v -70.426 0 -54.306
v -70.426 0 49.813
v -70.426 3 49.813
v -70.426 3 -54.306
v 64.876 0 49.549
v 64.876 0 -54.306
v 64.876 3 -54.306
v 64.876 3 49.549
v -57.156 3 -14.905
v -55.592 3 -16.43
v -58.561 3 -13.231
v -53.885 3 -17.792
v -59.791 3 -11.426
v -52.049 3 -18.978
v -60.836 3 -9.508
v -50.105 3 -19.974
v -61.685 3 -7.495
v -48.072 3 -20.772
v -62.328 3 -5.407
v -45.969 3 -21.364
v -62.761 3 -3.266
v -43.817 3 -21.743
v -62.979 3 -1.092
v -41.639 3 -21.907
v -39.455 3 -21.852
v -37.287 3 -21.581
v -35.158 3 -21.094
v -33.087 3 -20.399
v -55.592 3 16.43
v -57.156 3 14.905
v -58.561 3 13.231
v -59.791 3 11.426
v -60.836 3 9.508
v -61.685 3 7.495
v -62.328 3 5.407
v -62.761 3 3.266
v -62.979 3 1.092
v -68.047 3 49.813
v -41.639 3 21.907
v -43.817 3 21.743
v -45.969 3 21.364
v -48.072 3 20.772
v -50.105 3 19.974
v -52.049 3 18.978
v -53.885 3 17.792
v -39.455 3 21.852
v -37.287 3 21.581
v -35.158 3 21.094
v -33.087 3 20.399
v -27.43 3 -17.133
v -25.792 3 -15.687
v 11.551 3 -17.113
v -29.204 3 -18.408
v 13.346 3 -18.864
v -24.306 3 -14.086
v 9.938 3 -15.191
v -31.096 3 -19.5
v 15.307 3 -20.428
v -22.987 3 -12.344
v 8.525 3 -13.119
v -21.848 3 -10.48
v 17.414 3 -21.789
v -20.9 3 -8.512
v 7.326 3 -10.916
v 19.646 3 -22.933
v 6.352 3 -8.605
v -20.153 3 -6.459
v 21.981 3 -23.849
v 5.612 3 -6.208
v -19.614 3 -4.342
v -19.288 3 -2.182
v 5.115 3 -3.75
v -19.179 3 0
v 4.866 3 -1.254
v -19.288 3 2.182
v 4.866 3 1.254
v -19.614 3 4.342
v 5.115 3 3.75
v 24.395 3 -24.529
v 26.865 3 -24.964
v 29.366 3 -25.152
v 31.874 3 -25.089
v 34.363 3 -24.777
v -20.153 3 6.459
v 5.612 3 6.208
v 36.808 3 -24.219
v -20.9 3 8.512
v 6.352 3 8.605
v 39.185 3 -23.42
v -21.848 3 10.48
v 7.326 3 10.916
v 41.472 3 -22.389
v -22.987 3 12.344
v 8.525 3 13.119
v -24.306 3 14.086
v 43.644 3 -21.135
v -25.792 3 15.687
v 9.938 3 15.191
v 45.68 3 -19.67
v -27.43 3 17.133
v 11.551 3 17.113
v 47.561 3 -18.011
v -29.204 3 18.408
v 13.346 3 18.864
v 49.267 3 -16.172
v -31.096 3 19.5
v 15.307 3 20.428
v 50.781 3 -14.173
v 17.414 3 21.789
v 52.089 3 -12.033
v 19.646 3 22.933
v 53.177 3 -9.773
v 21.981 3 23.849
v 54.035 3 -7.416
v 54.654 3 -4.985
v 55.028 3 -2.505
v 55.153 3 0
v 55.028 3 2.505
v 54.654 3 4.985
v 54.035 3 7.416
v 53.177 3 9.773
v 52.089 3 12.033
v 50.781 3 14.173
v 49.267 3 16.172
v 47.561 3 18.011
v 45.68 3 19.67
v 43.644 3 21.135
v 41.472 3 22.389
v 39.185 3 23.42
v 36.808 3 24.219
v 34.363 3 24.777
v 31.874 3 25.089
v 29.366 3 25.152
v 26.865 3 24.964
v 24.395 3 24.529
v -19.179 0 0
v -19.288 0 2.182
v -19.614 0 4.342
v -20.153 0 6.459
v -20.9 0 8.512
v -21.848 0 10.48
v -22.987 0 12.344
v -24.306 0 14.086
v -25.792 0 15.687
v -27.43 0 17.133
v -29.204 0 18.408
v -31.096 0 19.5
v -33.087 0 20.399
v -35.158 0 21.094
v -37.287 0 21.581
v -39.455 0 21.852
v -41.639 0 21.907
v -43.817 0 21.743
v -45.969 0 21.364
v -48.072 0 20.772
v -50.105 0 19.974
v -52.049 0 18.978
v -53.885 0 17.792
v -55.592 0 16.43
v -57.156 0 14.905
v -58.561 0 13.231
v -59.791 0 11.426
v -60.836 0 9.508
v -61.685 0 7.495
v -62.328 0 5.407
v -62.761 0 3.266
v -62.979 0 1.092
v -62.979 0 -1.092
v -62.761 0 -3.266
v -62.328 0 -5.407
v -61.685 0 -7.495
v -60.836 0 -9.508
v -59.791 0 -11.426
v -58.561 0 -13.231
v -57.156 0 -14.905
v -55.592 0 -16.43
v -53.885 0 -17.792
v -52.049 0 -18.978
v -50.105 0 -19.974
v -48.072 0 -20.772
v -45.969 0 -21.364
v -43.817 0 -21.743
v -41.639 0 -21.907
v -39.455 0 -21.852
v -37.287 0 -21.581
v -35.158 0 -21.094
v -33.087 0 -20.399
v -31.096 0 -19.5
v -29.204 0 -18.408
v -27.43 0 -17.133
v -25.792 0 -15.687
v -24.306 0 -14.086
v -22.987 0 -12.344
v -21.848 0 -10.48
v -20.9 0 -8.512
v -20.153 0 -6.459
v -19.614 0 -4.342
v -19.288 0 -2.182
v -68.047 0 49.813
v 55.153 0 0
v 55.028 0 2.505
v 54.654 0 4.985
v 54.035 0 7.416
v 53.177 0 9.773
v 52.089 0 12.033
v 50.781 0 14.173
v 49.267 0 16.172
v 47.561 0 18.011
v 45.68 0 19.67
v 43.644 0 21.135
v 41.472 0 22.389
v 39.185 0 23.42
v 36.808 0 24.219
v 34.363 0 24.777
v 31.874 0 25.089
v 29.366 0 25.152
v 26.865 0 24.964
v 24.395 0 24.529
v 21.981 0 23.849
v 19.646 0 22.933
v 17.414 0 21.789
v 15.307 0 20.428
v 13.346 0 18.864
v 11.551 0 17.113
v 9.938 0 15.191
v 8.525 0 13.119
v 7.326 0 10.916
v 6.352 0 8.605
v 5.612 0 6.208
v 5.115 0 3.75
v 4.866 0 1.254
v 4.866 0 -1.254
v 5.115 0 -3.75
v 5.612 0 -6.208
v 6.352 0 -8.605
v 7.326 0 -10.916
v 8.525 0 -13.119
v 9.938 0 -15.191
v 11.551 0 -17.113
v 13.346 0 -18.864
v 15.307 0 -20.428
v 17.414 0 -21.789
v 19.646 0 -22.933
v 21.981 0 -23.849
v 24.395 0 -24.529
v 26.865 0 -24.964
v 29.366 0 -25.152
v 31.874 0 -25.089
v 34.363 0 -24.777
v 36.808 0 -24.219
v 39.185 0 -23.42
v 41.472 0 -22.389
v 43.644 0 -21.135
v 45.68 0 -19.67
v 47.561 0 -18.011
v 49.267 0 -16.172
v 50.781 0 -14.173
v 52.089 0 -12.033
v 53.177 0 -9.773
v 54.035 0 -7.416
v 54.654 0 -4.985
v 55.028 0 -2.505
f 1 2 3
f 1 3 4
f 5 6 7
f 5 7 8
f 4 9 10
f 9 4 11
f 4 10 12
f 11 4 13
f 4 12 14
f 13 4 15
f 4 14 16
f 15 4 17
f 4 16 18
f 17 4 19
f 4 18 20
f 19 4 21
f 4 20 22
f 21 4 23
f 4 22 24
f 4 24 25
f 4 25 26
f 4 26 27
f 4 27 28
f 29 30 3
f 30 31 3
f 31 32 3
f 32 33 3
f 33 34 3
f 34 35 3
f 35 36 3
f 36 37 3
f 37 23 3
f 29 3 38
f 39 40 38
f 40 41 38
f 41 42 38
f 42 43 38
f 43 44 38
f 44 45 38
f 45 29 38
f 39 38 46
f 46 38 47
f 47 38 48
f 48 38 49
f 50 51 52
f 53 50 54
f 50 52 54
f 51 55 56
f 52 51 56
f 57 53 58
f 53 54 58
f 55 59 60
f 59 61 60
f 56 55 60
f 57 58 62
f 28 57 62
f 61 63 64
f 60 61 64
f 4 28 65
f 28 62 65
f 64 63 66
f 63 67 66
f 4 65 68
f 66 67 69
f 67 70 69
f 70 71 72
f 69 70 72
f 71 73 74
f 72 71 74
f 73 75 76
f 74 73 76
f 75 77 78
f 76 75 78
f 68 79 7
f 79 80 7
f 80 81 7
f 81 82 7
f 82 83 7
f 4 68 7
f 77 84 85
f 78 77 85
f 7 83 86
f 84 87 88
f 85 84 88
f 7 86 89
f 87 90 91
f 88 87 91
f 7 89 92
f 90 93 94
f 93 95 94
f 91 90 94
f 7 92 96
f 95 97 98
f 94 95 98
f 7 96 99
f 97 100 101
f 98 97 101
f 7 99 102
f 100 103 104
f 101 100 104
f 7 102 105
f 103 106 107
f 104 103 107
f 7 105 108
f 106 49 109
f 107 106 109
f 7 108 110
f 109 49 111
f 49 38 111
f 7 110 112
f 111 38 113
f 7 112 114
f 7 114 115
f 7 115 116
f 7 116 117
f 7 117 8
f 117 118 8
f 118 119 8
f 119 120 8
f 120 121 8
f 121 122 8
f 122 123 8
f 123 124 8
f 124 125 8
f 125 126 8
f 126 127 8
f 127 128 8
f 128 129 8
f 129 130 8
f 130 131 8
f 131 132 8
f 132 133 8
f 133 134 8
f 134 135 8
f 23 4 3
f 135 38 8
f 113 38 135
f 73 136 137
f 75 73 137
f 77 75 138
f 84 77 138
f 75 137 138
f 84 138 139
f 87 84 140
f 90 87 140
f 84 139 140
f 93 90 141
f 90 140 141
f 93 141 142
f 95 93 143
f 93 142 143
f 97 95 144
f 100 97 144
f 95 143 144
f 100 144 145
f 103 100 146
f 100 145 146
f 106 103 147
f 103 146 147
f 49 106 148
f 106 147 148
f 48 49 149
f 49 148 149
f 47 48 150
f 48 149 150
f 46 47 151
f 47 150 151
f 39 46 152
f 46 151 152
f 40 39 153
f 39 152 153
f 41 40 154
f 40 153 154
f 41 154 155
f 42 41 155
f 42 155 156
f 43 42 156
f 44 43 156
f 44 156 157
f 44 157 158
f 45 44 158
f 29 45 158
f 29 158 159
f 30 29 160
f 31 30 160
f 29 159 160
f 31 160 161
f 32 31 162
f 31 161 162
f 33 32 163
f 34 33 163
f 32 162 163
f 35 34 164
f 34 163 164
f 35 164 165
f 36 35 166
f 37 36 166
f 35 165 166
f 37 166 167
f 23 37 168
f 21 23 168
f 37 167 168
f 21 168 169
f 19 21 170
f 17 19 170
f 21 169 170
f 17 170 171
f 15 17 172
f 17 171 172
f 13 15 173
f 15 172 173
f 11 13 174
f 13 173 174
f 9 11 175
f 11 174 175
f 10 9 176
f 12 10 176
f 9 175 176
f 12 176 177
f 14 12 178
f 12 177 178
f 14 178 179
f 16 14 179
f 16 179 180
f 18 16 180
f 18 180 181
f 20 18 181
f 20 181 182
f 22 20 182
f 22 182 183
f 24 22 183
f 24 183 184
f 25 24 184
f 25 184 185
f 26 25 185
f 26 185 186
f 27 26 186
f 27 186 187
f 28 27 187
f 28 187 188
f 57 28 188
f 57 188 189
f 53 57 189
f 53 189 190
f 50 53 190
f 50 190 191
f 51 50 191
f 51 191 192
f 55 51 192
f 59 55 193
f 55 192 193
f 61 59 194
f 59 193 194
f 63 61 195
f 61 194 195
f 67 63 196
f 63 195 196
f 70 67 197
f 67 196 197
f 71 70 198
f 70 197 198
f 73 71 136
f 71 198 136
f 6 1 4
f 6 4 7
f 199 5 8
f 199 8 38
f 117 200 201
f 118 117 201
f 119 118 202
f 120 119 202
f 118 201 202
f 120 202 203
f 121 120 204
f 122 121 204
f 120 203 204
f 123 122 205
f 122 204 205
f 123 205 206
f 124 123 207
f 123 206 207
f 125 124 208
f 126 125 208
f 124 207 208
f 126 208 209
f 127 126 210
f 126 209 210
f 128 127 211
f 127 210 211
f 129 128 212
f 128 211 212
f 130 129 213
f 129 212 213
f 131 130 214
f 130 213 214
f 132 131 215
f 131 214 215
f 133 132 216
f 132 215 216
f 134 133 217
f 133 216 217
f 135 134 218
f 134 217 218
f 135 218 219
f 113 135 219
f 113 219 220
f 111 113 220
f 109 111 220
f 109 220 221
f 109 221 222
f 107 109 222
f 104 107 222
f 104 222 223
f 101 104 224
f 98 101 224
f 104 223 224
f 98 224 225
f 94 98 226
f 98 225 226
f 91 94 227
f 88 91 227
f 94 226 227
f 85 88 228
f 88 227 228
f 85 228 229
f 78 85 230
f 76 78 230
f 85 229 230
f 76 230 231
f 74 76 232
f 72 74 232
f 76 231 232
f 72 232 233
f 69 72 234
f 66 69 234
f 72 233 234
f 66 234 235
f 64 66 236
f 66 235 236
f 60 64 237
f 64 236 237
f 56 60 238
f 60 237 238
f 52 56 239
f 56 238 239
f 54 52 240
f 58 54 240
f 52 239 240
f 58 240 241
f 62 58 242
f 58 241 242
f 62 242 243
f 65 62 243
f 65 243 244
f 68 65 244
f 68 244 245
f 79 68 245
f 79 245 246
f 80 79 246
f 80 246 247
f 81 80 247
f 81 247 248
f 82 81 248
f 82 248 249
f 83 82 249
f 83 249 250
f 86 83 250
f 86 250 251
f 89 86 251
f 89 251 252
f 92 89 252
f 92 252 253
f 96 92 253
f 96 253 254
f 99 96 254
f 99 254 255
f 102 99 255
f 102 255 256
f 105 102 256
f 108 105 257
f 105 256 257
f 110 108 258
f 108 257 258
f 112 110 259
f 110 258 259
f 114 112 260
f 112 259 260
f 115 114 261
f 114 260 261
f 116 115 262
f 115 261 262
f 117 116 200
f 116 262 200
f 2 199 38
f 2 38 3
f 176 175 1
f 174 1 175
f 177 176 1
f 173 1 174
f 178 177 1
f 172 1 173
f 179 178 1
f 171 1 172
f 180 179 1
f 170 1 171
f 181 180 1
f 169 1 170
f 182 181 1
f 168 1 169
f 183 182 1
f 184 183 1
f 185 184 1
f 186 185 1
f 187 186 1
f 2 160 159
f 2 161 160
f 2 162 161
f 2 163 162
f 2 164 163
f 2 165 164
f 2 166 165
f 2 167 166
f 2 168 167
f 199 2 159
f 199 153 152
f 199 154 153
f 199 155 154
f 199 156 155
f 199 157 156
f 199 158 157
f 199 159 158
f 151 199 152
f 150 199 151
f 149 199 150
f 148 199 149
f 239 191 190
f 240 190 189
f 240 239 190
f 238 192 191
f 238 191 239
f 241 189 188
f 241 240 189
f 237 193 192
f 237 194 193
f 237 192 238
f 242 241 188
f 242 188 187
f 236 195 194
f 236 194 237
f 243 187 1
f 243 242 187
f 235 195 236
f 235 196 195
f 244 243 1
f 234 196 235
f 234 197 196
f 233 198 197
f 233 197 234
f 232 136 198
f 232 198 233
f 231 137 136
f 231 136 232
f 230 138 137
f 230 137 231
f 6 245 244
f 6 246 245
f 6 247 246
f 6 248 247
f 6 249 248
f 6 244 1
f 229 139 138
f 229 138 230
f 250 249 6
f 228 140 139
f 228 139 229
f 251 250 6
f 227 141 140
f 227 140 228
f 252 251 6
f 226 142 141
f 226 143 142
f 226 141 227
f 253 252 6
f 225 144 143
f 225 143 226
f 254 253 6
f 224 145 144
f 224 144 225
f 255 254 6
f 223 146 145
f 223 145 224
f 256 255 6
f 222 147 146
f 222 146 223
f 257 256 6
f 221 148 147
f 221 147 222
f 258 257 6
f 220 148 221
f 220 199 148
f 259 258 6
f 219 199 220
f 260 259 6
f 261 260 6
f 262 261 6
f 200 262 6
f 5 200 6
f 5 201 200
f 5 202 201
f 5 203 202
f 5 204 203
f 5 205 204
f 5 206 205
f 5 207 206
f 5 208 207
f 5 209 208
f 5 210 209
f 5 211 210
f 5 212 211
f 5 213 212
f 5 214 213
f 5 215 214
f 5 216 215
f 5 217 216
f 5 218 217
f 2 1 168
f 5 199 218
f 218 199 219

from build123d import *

# Parameters (mm, degrees)
F0_R     = 21.913418
F0_R_2   = 25.159395
F1_DEPTH = 3


with BuildPart() as f1:
    # F0 (on Front) → F1 (new body)
    with BuildSketch(Plane.XZ):
        Polygon((-68.047404, 49.813341), (-70.425756, 49.813341), (-70.425756, -54.305792), (64.876266, -54.305792), (64.876266, 49.549077), align=None)
        with Locations((-41.092701, 0)):
            Circle(F0_R, mode=Mode.SUBTRACT)
        with Locations((29.993711, 0)):
            Circle(F0_R_2, mode=Mode.SUBTRACT)
    extrude(amount=-F1_DEPTH)


solid = f1.part
